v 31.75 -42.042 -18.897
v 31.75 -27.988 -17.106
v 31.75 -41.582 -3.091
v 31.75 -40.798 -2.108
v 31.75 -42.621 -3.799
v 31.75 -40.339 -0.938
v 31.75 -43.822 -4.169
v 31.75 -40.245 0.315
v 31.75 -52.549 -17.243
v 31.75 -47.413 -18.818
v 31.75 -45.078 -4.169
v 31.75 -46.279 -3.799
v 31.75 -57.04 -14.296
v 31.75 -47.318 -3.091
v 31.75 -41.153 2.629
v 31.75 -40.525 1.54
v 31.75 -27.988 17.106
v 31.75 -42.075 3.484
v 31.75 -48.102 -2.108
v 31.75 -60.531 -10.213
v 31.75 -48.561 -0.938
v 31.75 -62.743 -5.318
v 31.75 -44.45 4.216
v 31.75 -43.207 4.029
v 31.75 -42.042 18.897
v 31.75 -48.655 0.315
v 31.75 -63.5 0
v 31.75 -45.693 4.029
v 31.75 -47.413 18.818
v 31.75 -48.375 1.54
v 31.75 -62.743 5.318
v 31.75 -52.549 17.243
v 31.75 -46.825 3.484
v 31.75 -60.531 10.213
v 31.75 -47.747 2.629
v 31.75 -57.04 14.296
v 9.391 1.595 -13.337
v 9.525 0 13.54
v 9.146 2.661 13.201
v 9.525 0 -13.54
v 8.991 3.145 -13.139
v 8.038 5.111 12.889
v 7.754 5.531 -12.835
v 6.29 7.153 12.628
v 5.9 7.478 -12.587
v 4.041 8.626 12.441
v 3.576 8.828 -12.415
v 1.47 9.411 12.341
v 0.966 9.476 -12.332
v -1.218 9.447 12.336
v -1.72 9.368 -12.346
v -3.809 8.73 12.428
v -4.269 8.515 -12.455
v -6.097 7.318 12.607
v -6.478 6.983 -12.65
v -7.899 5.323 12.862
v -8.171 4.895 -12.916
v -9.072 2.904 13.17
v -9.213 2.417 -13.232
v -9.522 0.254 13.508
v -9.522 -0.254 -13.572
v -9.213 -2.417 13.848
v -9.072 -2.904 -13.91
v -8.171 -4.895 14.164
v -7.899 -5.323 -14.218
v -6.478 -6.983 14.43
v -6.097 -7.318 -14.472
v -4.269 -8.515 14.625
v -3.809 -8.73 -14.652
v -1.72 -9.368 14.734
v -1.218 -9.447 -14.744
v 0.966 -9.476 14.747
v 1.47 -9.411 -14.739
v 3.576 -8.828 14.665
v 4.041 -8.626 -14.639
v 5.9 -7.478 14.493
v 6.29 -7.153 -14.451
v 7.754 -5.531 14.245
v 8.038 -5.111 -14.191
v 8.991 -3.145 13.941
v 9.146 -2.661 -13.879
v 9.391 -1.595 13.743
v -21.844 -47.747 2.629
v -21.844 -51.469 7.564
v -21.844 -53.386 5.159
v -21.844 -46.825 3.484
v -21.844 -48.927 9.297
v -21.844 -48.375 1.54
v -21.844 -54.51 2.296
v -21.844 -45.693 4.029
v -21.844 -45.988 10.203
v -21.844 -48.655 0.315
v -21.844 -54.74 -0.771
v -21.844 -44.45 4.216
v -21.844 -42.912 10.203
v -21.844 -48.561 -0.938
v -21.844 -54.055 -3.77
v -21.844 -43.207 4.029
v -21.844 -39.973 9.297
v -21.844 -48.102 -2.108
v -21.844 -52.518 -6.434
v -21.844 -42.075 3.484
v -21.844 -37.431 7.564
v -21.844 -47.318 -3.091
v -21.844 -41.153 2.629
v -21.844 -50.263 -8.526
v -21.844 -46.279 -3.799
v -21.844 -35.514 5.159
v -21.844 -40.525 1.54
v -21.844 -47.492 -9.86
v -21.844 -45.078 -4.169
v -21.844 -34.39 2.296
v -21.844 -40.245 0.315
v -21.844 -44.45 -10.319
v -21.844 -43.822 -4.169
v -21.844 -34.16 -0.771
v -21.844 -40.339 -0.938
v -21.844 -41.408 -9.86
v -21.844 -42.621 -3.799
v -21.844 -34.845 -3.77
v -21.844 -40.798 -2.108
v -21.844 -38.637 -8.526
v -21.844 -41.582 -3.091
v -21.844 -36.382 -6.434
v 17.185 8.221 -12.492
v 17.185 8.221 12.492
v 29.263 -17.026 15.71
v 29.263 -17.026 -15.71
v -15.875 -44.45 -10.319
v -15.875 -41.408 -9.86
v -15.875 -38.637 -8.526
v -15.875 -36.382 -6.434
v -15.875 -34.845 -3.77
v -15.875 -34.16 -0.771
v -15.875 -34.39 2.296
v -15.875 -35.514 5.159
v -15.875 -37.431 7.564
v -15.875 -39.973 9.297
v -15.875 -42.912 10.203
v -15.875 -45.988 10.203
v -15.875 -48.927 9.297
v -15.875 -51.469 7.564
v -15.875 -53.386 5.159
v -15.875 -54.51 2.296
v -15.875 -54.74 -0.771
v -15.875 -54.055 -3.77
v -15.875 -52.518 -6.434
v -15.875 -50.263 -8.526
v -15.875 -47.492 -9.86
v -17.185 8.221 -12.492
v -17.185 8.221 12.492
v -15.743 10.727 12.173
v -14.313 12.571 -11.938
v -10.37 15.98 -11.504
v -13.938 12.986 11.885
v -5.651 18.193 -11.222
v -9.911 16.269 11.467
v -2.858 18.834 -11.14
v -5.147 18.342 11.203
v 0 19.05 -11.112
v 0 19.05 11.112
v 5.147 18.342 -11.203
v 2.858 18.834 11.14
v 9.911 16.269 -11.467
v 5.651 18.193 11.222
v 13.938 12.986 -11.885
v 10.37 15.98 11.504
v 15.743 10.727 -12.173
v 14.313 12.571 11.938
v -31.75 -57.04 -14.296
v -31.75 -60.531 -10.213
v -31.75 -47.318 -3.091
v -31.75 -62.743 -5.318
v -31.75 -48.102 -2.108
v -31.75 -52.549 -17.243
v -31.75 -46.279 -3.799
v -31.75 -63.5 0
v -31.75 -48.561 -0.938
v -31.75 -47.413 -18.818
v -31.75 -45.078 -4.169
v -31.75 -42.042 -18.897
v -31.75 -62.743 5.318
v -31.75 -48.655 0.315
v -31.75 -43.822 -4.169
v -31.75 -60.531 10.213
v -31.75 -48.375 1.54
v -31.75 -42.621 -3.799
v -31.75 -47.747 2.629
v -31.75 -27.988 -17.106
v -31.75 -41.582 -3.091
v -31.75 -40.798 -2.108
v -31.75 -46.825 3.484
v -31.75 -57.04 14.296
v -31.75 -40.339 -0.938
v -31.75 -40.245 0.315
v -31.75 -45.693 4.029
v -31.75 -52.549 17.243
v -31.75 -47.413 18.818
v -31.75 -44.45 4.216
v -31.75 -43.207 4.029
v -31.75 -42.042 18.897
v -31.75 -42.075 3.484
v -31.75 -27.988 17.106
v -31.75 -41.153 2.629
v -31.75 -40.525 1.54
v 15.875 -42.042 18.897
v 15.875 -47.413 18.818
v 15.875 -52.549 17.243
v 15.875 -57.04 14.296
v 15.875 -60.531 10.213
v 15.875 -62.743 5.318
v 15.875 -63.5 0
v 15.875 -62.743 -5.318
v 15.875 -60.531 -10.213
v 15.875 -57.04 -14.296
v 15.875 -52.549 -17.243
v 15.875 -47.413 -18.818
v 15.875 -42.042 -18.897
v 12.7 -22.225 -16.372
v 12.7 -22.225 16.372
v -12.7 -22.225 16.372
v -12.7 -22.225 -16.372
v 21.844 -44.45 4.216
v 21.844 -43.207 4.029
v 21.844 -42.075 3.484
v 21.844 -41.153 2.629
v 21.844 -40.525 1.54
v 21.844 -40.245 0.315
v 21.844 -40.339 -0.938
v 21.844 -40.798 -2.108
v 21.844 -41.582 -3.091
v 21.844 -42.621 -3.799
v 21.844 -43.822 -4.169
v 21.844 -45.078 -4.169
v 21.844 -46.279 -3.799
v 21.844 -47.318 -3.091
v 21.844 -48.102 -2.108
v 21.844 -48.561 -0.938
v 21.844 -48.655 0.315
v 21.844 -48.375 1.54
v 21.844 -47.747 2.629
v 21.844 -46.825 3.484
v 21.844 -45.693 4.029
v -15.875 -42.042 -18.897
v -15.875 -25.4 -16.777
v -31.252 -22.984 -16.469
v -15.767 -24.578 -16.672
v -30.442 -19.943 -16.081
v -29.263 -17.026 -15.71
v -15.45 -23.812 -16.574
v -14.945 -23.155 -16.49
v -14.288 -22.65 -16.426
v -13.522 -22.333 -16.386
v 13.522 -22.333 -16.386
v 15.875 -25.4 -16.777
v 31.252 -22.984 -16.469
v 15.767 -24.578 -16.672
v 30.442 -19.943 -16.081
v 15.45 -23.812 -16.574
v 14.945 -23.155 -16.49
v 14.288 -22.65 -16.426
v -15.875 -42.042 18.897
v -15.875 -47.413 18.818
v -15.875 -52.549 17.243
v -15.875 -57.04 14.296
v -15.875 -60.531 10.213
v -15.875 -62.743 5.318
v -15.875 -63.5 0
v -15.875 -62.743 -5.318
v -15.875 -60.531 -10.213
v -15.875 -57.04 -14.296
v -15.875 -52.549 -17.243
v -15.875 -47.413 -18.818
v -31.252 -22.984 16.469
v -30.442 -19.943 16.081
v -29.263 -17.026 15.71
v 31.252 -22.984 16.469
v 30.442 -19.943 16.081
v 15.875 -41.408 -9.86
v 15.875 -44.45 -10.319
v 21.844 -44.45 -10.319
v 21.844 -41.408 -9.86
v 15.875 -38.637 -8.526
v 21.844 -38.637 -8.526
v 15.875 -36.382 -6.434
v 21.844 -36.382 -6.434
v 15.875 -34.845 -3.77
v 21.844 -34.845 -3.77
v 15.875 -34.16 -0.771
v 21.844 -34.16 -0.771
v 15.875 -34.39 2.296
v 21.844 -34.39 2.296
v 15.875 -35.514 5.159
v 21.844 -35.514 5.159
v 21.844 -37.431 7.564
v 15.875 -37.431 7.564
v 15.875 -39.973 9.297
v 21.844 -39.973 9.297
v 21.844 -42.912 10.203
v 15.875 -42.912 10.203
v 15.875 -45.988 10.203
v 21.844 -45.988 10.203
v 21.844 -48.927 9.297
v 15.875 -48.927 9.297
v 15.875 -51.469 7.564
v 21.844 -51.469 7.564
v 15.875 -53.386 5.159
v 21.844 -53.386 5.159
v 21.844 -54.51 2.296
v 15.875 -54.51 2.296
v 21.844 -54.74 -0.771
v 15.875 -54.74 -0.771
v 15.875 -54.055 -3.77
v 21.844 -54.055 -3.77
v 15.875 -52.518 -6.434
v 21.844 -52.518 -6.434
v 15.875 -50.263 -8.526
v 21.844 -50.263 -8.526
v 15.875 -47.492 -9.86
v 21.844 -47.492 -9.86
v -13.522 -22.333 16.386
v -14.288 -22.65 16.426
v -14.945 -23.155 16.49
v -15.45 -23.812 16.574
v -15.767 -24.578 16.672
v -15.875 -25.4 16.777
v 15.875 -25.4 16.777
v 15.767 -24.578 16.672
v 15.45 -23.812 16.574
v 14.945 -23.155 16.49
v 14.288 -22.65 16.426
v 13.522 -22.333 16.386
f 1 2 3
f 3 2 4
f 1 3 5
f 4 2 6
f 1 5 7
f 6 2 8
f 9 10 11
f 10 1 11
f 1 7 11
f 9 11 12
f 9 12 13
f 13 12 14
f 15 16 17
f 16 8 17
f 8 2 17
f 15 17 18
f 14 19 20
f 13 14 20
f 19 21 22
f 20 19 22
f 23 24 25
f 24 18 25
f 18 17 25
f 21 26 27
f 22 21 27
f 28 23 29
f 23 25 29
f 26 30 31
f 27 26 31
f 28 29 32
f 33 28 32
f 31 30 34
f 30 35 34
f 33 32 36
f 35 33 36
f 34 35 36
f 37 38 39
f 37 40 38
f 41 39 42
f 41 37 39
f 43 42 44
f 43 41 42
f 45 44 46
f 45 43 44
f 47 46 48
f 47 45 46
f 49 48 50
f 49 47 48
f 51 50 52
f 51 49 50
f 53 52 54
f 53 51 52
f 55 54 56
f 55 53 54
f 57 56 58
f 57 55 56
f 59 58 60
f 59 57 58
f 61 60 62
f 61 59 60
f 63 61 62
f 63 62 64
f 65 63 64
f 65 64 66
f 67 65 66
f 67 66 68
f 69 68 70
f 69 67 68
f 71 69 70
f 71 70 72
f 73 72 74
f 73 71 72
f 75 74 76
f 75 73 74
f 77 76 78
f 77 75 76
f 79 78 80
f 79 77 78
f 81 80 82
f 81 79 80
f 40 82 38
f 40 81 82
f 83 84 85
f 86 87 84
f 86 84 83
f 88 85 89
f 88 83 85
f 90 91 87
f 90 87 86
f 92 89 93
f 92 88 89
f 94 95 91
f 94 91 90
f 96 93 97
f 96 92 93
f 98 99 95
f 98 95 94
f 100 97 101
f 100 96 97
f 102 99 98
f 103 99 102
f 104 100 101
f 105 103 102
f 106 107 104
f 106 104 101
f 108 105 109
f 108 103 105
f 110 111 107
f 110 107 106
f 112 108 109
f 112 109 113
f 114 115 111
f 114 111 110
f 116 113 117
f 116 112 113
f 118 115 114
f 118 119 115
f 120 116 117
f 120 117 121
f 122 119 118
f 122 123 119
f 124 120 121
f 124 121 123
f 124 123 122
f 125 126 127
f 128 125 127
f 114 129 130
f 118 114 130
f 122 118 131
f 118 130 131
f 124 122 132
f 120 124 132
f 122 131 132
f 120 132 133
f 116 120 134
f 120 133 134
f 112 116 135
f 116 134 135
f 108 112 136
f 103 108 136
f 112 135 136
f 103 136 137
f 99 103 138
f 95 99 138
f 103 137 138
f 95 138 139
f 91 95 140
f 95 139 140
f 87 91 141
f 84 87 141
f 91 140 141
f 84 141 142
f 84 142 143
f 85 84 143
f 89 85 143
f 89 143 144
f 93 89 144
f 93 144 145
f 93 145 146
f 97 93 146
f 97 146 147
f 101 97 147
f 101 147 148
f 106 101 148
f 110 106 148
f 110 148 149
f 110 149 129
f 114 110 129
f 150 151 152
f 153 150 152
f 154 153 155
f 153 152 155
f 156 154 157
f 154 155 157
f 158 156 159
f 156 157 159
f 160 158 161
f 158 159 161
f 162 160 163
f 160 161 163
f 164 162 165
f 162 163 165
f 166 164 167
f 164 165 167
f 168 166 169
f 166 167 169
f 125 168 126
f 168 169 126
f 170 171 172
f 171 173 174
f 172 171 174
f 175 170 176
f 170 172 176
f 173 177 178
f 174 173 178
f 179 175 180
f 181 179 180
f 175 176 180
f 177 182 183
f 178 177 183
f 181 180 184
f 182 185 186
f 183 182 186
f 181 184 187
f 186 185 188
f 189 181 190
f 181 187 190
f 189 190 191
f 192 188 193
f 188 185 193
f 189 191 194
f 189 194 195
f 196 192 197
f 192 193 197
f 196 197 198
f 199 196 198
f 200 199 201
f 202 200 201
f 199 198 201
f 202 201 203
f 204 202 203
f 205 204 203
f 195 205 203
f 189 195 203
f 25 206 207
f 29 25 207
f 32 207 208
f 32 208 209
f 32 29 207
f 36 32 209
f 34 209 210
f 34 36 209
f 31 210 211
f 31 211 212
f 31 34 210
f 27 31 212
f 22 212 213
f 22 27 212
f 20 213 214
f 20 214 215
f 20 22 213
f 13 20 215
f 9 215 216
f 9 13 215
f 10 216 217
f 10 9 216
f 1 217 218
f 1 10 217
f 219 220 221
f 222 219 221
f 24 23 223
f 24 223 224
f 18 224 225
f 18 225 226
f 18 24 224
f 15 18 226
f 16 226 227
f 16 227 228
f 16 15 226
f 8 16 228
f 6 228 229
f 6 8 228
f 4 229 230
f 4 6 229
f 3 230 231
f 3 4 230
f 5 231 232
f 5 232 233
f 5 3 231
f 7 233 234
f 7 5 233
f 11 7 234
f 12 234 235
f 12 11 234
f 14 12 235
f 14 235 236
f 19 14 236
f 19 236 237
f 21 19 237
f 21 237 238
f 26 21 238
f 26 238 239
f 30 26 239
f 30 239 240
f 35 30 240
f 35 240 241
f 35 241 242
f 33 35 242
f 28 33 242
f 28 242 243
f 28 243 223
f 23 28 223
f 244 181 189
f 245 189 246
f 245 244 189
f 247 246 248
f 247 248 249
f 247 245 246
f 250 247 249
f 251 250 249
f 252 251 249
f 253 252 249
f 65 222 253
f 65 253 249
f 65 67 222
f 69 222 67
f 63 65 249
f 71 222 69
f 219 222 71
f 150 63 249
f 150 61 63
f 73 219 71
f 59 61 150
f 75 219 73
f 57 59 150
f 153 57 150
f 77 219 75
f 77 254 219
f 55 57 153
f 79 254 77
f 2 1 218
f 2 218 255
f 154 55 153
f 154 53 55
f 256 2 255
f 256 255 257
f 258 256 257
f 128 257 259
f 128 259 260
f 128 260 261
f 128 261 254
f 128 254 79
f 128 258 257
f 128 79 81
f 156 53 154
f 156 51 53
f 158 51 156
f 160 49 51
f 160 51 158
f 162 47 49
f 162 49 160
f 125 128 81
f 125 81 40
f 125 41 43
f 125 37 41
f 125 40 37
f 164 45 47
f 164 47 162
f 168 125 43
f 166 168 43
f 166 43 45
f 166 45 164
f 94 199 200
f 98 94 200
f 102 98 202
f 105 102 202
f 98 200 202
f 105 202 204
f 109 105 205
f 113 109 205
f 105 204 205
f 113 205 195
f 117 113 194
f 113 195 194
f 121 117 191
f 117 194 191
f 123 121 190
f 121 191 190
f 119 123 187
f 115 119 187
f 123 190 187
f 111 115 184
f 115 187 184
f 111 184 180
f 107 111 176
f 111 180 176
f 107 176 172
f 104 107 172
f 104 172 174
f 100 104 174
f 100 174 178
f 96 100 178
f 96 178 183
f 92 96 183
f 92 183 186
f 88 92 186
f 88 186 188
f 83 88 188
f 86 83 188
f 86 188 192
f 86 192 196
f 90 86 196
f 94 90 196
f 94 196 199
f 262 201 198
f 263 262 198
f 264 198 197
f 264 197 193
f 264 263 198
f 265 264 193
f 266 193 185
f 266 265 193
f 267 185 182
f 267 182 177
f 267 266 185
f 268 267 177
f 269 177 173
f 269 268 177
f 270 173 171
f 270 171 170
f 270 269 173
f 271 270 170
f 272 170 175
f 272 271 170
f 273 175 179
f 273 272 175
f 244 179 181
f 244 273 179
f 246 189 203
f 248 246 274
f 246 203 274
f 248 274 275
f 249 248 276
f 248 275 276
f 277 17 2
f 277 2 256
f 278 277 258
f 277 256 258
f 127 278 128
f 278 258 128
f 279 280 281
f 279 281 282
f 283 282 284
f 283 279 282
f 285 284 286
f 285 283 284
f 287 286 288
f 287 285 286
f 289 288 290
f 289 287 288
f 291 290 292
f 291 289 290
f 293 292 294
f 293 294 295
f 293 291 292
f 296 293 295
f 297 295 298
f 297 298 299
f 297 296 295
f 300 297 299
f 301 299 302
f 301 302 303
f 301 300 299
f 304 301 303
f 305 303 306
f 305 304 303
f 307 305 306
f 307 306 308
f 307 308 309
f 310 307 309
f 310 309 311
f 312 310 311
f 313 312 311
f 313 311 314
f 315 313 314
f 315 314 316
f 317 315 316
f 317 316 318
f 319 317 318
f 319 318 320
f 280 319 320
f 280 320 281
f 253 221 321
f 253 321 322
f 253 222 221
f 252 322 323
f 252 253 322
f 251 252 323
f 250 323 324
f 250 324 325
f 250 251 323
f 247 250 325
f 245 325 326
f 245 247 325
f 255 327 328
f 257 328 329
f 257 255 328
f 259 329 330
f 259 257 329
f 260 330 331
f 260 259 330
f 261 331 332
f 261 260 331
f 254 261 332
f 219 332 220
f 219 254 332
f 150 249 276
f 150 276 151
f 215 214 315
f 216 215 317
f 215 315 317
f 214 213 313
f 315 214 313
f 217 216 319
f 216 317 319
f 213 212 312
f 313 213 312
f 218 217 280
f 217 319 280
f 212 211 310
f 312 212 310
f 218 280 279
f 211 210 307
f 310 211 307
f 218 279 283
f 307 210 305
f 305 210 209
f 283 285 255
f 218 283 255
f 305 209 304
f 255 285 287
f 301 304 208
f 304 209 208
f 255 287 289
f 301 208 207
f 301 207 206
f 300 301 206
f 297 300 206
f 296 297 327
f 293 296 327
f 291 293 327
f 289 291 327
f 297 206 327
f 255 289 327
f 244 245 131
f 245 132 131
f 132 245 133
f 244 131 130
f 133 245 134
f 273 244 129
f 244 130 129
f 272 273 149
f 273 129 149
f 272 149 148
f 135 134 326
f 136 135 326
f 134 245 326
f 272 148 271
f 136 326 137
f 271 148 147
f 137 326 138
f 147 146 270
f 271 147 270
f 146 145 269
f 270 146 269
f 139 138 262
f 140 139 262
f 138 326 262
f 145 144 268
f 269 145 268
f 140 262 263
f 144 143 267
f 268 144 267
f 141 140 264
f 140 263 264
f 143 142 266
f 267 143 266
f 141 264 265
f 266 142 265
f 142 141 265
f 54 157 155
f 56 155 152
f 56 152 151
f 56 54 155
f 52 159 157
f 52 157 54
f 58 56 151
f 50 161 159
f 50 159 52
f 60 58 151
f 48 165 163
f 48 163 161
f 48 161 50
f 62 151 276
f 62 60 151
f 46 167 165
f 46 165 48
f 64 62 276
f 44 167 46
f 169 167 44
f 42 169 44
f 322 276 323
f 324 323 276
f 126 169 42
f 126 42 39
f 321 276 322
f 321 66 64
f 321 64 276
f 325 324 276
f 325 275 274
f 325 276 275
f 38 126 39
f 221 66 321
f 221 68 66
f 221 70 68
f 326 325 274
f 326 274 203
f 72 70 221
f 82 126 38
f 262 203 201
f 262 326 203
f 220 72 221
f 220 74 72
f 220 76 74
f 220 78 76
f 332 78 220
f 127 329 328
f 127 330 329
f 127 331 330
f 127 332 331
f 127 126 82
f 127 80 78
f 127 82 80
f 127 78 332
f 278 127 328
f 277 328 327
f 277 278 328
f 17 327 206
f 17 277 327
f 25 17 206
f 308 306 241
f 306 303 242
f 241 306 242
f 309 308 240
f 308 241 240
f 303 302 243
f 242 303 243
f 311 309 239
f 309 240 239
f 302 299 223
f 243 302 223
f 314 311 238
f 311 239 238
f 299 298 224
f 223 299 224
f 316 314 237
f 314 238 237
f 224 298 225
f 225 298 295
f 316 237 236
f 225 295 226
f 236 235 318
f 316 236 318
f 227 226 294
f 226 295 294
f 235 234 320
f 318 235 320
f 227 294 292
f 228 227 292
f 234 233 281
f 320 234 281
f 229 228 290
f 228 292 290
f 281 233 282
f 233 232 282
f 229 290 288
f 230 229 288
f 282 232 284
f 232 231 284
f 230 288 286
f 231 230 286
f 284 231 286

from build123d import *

# Parameters (mm, degrees)
SKETCH1_R                                 = 9.525
BOSS_EXTRUDE1_DEPTH                       = 19.05
SKETCH2_OUTSIDE_W                         = 62.28
SKETCH2_OUTSIDE_H                         = 106.73
CUT_EXTRUDE1_DEPTH                        = 31.75
FILLET1_R                                 = 3.175
FILLET2_R                                 = 25.4
CBORE_FOR_5_16_HEX_CAP_SCREW1_D           = 8.4328
CBORE_FOR_5_16_HEX_CAP_SCREW1_DEPTH       = 15.875
CBORE_FOR_5_16_HEX_CAP_SCREW1_CBORE_D     = 20.6375
CBORE_FOR_5_16_HEX_CAP_SCREW1_CBORE_DEPTH = 5.969


with BuildPart() as part:
    # Sketch1 → Boss-Extrude1 (new body, symmetric)
    with BuildSketch(Plane.XY):
        with BuildLine():
            Line((17.184764726, 8.221092465), (31.75, -22.225))
            Line((31.75, -22.225), (31.75, -63.5))
            Line((31.75, -63.5), (15.875, -63.5))
            Line((15.875, -63.5), (15.875, -22.225))
            Line((15.875, -22.225), (-15.875, -22.225))
            Line((-15.875, -22.225), (-15.875, -63.5))
            Line((-15.875, -63.5), (-31.75, -63.5))
            Line((-31.75, -63.5), (-31.75, -22.225))
            Line((-31.75, -22.225), (-17.184764726, 8.221092465))
            ThreePointArc((-17.184764726, 8.221092465), (0, 19.05), (17.184764726, 8.221092465))
        make_face()
        Circle(SKETCH1_R, mode=Mode.SUBTRACT)
    extrude(amount=BOSS_EXTRUDE1_DEPTH, both=True)

    # Sketch2 outside → Cut-Extrude1 (cut, symmetric)
    with BuildSketch(Plane(origin=(0, 0, 0), x_dir=(0, 0, -1), z_dir=(1, 0, 0))):
        with Locations((0, -22.225)):
            Rectangle(SKETCH2_OUTSIDE_W, SKETCH2_OUTSIDE_H)
        with BuildLine():
            Line((18.897197735, -42.042009604), (11.1125, 19.05))
            Line((11.1125, 19.05), (-11.1125, 19.05))
            Line((-11.1125, 19.05), (-18.897197735, -42.042009604))
            ThreePointArc((-18.897197735, -42.042009604), (0, -63.5), (18.897197735, -42.042009604))
        make_face(mode=Mode.SUBTRACT)
    extrude(amount=CUT_EXTRUDE1_DEPTH, both=True, mode=Mode.SUBTRACT)

    # Fillet1
    fillet1_edges = [part.edges().sort_by_distance(p)[0] for p in [
        (15.875, -22.225, 0),
        (-15.875, -22.225, 0),
    ]]
    fillet(fillet1_edges, radius=FILLET1_R)

    # Fillet2
    fillet2_edges = [part.edges().sort_by_distance(p)[0] for p in [
        (31.75, -22.225, 0),
        (-31.75, -22.225, 0),
    ]]
    fillet(fillet2_edges, radius=FILLET2_R)

    # CBORE for 5/16 Hex Cap Screw1
    with Locations(Plane(origin=(-15.875, 0, 0), x_dir=(0, 0, -1), z_dir=(1, 0, 0))):
        with Locations((0, -44.45)):
            cbore_for_5_16_hex_cap_screw1 = CounterBoreHole(CBORE_FOR_5_16_HEX_CAP_SCREW1_D / 2, CBORE_FOR_5_16_HEX_CAP_SCREW1_CBORE_D / 2, CBORE_FOR_5_16_HEX_CAP_SCREW1_CBORE_DEPTH, depth=CBORE_FOR_5_16_HEX_CAP_SCREW1_DEPTH)

    # Mirror1: CBORE for 5/16 Hex Cap Screw1 across plane
    add(cbore_for_5_16_hex_cap_screw1.mirror(Plane(origin=(0, 0, 0), x_dir=(0, 0, 1), z_dir=(1, 0, 0))), mode=Mode.SUBTRACT)


solid = part.part
